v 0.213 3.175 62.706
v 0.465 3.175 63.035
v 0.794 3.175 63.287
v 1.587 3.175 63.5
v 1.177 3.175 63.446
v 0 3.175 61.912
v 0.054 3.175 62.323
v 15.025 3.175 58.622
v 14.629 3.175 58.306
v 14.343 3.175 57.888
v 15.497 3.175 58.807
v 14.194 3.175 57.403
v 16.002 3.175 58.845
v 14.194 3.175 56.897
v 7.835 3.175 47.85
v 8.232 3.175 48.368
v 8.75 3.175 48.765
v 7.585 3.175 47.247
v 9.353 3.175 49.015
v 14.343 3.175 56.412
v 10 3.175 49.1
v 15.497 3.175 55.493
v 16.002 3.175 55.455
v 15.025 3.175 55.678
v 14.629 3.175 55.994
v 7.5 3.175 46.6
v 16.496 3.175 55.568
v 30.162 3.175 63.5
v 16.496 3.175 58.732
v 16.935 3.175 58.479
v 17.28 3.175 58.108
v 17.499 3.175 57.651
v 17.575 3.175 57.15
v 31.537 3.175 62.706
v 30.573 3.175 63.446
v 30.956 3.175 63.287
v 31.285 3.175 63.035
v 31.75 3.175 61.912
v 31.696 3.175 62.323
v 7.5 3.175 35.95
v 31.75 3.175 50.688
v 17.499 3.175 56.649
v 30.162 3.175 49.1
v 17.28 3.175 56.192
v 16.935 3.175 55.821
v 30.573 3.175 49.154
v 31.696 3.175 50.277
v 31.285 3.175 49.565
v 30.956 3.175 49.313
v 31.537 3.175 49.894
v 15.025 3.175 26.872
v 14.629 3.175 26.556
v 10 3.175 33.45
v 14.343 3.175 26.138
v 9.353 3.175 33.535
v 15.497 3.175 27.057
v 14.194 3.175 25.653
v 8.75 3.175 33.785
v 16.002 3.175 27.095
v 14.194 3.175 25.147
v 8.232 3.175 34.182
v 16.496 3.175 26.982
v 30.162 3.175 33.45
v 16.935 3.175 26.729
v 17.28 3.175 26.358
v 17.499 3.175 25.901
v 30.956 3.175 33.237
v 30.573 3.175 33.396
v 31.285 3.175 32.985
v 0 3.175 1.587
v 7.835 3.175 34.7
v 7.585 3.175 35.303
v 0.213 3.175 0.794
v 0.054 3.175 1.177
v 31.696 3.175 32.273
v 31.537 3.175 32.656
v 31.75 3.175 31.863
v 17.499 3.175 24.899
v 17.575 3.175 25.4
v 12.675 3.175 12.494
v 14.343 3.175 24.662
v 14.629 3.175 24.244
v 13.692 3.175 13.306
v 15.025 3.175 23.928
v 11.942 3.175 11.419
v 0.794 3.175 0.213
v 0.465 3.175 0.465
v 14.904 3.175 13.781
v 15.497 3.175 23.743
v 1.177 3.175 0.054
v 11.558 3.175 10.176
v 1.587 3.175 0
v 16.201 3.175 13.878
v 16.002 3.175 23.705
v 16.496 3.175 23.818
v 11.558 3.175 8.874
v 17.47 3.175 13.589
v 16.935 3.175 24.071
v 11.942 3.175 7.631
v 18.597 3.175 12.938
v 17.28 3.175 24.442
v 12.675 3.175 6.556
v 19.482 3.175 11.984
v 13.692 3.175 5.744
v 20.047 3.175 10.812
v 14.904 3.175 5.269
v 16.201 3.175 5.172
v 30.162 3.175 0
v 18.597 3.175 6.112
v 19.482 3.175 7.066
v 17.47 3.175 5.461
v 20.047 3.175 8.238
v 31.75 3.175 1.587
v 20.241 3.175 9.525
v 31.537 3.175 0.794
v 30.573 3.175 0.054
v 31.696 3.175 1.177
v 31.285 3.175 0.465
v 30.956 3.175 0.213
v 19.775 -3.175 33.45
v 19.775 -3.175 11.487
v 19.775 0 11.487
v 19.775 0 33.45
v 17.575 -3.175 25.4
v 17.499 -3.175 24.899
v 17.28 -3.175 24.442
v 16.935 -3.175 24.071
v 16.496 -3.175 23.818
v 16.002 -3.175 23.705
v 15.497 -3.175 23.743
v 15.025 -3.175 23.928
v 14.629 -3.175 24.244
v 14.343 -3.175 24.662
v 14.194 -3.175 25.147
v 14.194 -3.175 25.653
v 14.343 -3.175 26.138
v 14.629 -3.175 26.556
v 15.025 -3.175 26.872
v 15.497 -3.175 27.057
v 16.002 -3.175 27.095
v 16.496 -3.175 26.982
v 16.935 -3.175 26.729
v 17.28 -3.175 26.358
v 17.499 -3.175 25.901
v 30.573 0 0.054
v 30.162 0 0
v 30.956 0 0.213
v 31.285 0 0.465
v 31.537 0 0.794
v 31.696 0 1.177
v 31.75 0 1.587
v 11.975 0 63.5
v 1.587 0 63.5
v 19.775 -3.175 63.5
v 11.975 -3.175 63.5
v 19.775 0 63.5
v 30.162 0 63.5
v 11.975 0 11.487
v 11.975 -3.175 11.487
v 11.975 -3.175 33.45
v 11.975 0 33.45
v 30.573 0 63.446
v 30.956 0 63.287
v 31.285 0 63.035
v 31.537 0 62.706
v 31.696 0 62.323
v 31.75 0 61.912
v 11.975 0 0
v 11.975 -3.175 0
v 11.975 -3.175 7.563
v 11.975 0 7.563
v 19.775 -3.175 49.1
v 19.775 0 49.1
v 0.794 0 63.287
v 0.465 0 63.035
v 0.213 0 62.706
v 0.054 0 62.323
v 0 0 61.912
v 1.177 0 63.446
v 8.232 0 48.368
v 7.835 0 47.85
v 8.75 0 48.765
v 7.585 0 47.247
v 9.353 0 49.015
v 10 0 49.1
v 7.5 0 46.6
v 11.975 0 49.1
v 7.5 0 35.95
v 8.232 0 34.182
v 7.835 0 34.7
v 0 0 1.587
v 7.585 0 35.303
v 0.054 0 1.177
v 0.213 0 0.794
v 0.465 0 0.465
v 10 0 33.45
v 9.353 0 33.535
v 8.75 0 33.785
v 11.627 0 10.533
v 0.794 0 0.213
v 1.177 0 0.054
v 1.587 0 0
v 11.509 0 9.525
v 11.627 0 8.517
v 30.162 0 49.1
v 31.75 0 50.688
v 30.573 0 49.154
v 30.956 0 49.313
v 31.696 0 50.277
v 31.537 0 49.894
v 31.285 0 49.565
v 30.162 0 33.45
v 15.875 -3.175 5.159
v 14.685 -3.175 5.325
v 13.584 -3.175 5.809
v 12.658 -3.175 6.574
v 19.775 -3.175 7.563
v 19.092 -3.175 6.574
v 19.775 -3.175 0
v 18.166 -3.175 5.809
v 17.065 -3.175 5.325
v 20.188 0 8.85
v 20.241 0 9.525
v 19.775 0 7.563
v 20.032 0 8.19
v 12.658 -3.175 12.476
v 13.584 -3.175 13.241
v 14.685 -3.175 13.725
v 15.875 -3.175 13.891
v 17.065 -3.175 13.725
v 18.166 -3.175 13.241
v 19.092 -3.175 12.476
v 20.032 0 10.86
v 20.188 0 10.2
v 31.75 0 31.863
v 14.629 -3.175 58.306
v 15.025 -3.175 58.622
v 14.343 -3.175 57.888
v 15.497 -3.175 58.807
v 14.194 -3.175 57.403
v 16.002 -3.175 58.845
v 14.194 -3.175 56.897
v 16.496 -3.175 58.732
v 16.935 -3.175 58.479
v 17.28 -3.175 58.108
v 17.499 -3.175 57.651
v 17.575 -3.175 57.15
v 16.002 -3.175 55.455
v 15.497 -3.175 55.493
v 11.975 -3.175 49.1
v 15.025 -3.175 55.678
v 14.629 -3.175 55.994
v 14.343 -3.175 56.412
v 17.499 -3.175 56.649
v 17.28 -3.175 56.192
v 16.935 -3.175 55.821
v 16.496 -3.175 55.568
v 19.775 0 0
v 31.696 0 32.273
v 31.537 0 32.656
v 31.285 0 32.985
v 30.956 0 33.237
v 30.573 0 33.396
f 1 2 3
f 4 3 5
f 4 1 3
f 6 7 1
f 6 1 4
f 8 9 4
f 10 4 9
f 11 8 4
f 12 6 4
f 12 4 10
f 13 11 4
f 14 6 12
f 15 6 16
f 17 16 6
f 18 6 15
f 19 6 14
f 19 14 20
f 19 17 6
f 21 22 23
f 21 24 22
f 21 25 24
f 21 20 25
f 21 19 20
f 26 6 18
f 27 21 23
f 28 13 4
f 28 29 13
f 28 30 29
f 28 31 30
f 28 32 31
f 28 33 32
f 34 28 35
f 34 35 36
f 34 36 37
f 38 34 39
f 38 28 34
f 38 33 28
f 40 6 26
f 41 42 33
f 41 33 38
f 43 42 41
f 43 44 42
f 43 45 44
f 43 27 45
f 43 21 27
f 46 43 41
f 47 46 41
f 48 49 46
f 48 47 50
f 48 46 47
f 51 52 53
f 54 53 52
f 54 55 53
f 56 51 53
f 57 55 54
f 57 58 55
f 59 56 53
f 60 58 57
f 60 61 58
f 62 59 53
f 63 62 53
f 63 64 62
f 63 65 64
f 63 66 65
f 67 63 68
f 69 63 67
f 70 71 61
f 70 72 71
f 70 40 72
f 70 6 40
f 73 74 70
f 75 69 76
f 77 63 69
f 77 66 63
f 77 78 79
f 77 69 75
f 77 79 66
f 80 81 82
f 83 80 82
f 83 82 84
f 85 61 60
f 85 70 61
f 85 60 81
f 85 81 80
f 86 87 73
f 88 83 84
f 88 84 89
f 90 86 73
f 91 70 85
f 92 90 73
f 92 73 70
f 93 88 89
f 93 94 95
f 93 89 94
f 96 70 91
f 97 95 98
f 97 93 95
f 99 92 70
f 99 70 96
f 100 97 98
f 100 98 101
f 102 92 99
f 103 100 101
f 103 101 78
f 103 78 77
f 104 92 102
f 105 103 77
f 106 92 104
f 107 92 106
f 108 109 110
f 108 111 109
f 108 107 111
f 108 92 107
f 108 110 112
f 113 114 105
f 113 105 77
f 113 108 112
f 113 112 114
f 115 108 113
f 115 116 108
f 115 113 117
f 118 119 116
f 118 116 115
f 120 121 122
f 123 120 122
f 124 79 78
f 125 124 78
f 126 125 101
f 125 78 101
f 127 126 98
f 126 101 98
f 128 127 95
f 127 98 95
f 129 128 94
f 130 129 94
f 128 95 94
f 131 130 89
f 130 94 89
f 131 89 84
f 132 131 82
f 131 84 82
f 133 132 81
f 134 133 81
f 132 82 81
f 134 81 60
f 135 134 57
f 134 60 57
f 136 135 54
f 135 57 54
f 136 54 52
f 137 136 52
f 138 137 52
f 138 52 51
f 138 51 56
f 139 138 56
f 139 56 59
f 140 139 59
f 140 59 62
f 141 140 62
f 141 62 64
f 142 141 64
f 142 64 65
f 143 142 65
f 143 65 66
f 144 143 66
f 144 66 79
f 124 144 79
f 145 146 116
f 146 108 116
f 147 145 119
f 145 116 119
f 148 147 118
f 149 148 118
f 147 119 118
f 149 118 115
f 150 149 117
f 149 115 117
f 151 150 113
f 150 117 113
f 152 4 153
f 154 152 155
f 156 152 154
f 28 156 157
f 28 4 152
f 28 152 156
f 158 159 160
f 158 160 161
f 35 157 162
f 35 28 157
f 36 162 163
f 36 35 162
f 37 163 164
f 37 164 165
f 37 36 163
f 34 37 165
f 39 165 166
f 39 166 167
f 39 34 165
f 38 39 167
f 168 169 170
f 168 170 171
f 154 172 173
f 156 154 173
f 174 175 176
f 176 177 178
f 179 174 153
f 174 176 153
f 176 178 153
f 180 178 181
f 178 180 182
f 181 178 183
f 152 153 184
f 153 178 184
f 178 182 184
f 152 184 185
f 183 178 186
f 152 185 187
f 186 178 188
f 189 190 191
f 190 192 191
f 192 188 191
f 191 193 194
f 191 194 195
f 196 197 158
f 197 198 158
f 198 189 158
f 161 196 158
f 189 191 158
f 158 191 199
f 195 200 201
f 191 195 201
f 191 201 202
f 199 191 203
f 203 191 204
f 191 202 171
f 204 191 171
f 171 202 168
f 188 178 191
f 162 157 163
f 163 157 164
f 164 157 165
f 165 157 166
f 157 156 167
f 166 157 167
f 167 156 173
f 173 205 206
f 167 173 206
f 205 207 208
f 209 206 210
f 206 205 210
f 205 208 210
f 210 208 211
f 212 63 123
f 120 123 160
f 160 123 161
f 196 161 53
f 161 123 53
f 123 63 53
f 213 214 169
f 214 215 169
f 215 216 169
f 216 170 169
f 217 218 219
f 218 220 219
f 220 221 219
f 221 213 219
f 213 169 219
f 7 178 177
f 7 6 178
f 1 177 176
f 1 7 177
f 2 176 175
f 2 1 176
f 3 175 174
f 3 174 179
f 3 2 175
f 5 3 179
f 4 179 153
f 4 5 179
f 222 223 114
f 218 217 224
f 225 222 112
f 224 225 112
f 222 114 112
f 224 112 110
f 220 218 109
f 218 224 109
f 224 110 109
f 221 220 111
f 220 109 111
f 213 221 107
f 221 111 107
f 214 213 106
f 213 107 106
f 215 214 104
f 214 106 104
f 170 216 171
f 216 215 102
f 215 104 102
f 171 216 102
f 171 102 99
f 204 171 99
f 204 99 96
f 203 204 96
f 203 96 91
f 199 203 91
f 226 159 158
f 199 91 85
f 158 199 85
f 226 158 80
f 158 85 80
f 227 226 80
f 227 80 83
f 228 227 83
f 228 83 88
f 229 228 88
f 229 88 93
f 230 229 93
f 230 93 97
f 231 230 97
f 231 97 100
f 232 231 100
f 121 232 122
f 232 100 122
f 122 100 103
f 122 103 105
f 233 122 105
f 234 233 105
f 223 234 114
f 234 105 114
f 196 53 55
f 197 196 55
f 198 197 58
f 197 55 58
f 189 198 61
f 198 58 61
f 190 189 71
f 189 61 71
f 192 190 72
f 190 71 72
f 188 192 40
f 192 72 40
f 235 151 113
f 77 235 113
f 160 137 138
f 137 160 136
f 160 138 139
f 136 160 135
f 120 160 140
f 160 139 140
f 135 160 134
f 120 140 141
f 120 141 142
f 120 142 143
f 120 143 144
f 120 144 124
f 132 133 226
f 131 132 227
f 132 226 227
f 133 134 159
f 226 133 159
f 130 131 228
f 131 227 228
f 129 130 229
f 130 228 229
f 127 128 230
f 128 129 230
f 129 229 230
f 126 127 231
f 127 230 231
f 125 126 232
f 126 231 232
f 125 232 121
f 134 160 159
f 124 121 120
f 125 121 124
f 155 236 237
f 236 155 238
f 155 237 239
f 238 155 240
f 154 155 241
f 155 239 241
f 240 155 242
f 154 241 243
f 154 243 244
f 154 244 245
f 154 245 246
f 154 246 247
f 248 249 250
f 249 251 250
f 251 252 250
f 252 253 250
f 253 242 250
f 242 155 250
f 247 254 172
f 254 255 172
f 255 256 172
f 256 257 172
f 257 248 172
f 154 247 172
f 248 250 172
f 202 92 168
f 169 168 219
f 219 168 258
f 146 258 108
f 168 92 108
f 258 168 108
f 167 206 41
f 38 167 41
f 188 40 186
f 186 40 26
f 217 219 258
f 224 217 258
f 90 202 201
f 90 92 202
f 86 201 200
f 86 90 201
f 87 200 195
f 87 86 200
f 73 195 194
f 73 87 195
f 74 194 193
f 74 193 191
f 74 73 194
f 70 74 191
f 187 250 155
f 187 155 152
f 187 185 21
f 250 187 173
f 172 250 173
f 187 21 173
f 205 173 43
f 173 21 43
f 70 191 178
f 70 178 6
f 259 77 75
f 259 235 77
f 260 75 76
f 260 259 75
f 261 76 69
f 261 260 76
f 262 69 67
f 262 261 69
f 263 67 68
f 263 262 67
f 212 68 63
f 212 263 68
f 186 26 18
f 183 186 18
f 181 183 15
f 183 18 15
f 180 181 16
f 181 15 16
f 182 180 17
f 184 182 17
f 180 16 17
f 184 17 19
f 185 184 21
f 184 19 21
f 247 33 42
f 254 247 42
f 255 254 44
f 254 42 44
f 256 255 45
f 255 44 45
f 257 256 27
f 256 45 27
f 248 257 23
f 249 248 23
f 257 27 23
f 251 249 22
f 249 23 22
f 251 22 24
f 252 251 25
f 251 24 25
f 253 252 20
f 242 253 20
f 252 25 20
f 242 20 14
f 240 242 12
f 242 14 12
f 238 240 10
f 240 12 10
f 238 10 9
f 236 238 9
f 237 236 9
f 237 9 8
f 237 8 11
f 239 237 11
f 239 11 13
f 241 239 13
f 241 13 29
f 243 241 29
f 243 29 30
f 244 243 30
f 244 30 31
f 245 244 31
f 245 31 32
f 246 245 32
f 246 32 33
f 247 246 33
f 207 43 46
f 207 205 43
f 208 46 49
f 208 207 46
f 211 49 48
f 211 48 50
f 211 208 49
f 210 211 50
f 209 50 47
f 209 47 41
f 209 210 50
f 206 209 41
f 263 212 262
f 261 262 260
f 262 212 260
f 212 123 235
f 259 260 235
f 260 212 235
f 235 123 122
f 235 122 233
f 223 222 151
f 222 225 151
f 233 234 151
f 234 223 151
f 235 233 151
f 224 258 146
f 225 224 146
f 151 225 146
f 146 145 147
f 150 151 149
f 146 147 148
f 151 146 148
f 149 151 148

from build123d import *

# Parameters (mm, degrees)
SKETCH3_W           = 7.8
SKETCH3_H           = 3.175
SKETCH3_W_2         = 31.75
BOSS_EXTRUDE2_DEPTH = 63.5
SKETCH4_R           = 4.365625
SKETCH4_R_2         = 1.7
CUT_EXTRUDE1_DEPTH  = 7.35
FILLET1_R           = 1.5875


with BuildPart() as part:
    # Sketch3 → Boss-Extrude2 (new body)
    with BuildSketch(Plane.XY):
        with Locations((15.875, -1.5875)):
            Rectangle(SKETCH3_W, SKETCH3_H)
        with Locations((15.875, 1.5875)):
            Rectangle(SKETCH3_W_2, SKETCH3_H)
    extrude(amount=BOSS_EXTRUDE2_DEPTH)

    # Sketch4 → Cut-Extrude1 (cut, through all)
    with BuildSketch(Plane(origin=(0, 3.175, 0), x_dir=(1, 0, 0), z_dir=(0, 1, 0))):
        with BuildLine():
            Line((10, -49.1), (31.75, -49.1))
            Line((31.75, -49.1), (31.75, -33.45))
            Line((31.75, -33.45), (10, -33.45))
            ThreePointArc((10, -33.45), (8.232233047, -34.182233047), (7.5, -35.95))
            Line((7.5, -35.95), (7.5, -46.6))
            ThreePointArc((7.5, -46.6), (8.232233047, -48.367766953), (10, -49.1))
        make_face()
        with Locations((15.875, -9.525)):
            Circle(SKETCH4_R)
        with Locations((15.875, -25.4)):
            Circle(SKETCH4_R_2)
        with Locations((15.875, -57.15)):
            Circle(SKETCH4_R_2)
    extrude(amount=-CUT_EXTRUDE1_DEPTH, mode=Mode.SUBTRACT)

    # Fillet1
    fillet1_edges = [part.edges().sort_by_distance(p)[0] for p in [
        (0, 1.5875, 0),
        (31.75, 1.5875, 0),
        (31.75, 1.5875, 63.5),
        (0, 1.5875, 63.5),
        (31.75, 1.5875, 33.45),
        (31.75, 1.5875, 49.1),
    ]]
    fillet(fillet1_edges, radius=FILLET1_R)


solid = part.part
